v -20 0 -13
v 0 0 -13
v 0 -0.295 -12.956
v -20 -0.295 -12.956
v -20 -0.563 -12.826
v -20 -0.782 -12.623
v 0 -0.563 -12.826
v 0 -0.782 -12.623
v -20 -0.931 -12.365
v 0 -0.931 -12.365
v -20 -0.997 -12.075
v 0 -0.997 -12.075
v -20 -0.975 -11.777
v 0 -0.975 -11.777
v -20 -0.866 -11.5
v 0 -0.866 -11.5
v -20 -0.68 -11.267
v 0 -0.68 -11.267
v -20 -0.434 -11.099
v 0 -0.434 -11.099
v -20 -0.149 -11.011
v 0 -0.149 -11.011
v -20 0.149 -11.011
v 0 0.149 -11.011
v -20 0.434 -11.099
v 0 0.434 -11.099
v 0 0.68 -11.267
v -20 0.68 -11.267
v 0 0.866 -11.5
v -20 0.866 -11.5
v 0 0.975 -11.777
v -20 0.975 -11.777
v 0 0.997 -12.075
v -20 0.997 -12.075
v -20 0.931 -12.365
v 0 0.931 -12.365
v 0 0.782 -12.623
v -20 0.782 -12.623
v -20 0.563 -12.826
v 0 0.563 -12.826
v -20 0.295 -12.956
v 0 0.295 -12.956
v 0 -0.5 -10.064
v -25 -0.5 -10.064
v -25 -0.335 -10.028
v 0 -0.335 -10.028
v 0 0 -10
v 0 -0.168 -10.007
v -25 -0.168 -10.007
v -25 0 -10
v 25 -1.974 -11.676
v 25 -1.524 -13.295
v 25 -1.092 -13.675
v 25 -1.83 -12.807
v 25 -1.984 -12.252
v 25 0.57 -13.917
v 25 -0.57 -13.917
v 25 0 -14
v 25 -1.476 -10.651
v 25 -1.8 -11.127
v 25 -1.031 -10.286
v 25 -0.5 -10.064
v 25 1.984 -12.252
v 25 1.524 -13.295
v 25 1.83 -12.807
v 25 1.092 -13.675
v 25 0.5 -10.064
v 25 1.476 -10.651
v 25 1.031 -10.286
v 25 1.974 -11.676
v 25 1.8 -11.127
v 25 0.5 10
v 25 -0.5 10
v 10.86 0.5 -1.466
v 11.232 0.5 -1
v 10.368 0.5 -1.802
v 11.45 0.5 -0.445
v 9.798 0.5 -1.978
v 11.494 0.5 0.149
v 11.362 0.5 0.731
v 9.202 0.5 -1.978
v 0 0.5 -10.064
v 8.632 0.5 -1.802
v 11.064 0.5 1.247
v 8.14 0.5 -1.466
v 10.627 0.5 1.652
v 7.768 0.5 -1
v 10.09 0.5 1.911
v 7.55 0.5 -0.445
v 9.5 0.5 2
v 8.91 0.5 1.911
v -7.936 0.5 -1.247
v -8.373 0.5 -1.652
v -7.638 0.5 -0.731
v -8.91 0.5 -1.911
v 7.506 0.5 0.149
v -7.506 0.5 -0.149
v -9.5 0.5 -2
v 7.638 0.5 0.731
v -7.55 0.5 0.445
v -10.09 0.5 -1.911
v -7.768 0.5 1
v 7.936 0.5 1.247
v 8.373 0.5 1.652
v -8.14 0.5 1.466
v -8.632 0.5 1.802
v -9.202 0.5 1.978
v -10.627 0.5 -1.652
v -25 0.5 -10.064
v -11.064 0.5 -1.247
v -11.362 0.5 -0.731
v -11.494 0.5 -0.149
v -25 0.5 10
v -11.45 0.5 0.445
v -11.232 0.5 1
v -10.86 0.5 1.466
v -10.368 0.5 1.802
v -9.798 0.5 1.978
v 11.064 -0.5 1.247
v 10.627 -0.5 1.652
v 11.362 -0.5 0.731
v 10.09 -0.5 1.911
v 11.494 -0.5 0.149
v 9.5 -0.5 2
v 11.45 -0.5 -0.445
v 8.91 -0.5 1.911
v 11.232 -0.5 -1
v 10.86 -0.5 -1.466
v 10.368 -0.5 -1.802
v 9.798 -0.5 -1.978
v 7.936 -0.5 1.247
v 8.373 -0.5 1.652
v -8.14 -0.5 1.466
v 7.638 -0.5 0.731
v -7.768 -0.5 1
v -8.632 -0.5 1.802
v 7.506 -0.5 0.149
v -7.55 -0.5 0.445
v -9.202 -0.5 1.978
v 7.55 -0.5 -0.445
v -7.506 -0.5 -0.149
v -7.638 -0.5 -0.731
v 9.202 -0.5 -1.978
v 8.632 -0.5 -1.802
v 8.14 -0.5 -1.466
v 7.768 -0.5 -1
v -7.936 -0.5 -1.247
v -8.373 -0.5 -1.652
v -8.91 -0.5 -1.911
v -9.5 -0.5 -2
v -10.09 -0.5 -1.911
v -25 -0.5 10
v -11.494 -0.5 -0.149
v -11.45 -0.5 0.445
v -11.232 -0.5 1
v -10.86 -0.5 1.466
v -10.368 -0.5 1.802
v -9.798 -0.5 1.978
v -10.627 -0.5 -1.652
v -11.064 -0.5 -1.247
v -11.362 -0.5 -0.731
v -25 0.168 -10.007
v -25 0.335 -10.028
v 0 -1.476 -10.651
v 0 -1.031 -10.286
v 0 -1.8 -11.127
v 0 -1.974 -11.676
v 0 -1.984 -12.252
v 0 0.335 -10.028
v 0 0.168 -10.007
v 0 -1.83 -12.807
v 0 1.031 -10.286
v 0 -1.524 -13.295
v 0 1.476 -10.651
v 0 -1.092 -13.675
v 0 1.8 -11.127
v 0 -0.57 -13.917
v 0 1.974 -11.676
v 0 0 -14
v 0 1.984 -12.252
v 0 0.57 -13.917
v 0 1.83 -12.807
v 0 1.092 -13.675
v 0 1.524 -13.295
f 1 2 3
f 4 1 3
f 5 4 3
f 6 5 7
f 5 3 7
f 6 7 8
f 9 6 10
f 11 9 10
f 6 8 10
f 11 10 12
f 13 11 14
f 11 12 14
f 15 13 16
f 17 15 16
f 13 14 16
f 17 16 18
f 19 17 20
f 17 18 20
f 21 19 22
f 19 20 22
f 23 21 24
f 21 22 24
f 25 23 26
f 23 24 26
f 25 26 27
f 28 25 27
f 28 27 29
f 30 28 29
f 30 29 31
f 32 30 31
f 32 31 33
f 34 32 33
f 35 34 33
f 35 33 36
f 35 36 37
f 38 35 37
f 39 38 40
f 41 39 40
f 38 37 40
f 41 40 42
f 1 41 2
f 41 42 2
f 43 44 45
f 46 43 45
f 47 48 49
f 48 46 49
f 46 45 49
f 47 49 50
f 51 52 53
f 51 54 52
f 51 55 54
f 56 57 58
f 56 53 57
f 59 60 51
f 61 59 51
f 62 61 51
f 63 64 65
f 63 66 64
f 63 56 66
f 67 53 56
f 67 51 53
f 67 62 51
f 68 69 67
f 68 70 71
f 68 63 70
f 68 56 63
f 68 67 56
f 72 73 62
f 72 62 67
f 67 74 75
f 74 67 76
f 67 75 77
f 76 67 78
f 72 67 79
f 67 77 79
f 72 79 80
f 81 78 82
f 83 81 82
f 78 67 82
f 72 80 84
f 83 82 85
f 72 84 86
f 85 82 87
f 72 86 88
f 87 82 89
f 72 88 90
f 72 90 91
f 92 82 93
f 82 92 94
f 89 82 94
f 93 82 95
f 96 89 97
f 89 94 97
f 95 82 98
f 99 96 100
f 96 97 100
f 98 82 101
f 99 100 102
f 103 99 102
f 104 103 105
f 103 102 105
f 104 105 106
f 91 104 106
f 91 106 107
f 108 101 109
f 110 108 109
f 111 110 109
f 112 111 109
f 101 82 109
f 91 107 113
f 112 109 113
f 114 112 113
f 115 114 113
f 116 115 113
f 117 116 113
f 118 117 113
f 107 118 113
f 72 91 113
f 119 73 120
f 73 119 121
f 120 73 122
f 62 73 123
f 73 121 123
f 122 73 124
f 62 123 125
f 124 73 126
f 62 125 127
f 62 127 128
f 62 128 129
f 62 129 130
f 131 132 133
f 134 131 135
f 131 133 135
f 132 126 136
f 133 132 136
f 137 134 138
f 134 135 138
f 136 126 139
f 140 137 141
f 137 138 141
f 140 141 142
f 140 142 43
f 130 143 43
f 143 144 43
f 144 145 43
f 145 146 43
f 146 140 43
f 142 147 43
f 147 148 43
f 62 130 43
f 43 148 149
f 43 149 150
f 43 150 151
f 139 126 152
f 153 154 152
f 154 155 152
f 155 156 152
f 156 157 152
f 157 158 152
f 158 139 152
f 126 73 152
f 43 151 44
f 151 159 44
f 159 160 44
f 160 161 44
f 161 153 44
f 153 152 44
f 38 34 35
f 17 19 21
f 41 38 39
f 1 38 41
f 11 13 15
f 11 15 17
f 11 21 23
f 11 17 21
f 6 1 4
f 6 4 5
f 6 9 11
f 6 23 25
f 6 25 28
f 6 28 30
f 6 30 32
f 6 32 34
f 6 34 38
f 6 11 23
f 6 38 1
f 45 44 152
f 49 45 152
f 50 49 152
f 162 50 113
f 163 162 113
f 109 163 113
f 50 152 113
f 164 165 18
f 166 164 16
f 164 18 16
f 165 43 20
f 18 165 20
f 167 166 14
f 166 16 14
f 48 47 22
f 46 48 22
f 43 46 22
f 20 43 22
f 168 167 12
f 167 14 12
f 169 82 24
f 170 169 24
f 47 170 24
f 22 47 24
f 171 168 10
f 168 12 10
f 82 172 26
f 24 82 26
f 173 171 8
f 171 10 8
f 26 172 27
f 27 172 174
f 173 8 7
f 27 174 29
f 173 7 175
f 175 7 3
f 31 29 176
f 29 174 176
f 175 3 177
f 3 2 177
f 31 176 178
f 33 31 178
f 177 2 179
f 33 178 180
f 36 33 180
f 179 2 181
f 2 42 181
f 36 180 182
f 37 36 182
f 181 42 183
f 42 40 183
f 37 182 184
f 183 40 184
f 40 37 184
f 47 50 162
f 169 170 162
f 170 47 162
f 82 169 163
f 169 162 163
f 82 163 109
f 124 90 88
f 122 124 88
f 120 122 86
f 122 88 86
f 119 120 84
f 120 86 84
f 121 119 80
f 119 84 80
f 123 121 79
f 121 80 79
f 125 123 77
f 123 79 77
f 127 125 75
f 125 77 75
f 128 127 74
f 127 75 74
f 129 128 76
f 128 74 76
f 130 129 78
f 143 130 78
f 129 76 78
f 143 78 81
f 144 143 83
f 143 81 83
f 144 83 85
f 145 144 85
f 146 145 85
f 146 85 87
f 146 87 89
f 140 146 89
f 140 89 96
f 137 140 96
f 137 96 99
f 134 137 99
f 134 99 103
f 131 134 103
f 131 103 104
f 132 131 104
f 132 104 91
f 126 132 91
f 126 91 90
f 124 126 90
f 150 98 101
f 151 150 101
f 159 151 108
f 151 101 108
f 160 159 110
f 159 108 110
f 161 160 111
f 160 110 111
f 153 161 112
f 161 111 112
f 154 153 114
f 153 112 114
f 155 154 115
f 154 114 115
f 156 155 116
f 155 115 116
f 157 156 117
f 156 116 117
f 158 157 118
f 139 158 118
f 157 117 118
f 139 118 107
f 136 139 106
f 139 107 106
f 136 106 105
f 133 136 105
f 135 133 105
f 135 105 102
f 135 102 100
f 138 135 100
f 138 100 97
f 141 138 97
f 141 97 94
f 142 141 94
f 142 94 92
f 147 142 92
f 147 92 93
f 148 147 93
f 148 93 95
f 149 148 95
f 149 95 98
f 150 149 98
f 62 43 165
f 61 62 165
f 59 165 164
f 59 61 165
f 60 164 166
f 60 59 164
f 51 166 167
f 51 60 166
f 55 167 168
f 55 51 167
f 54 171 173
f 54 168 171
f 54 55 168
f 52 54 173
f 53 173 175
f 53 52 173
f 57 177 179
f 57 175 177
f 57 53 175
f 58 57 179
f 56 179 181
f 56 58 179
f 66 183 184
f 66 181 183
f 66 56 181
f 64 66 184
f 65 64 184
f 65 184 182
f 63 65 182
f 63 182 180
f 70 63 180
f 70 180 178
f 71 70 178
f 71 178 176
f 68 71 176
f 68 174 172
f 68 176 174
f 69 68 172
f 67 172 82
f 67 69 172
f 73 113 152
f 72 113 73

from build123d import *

# Parameters (mm, degrees)
SKETCH1_W                = 50
SKETCH1_H                = 20
BOSS_EXTRUDE1_DEPTH      = 0.5
SKETCH2_R                = 2
BOSS_EXTRUDE2_DEPTH      = 25
SKETCH3_R                = 1
BOSS_EXTRUDE3_DEPTH      = 20
BOSS_EXTRUDE4_REACH      = 34.078
BOSS_EXTRUDE4_END_RADIUS = 2
SKETCH4_W                = 50
SKETCH4_H                = 1
SKETCH5_R                = 2
CUT_EXTRUDE1_DEPTH       = 29.761954037


with BuildPart() as part:
    # Sketch1 → Boss-Extrude1 (new, symmetric)
    with BuildSketch(Plane(origin=(0, 0, 0), x_dir=(1, 0, 0), z_dir=(0, 1, 0))):
        Rectangle(SKETCH1_W, SKETCH1_H)
    extrude(amount=BOSS_EXTRUDE1_DEPTH, both=True)



with BuildPart() as body_2:
    # Sketch2 → Boss-Extrude2 (new body)
    with BuildSketch(Plane(origin=(25, 0, 0), x_dir=(0, 0, -1), z_dir=(1, 0, 0))):
        with Locations((12, 0)):
            Circle(SKETCH2_R)
    extrude(amount=-BOSS_EXTRUDE2_DEPTH)

    # Sketch3 → Boss-Extrude3 (add)
    with BuildSketch(Plane.ZY):
        with Locations((-12, 0)):
            Circle(SKETCH3_R)
    extrude(amount=BOSS_EXTRUDE3_DEPTH)


with BuildPart() as part_1:
    add(part.part)

    add(body_2.part)  # Boss-Extrude4 merges body 2
    # Boss-Extrude4: up to this cylinder (the profile starts outside it)
    boss_extrude4_end = Plane(origin=(0, 0, -12), z_dir=(1, 0, 0)) * Cylinder(BOSS_EXTRUDE4_END_RADIUS, 73.156, mode=Mode.PRIVATE)
    # Sketch4 → Boss-Extrude4 (add, up to the surface)
    with BuildSketch(Plane(origin=(0, 0, -10), x_dir=(-1, 0, 0), z_dir=(0, 0, -1)), mode=Mode.PRIVATE) as boss_extrude4_sk1:
        Rectangle(SKETCH4_W, SKETCH4_H)
    boss_extrude4_tool1 = extrude(boss_extrude4_sk1.sketch, amount=BOSS_EXTRUDE4_REACH, mode=Mode.PRIVATE) - boss_extrude4_end
    add(boss_extrude4_tool1.solids().sort_by_distance((0, 0, -10))[0])
    add(boss_extrude4_tool1.solids().sort_by_distance((0, 0, -10))[1])

    # Sketch5 → Cut-Extrude1 (cut, through all)
    with BuildSketch(Plane(origin=(0, 0.5, 0), x_dir=(1, 0, 0), z_dir=(0, 1, 0))):
        with Locations((9.5, 0)):
            Circle(SKETCH5_R)
        with Locations((-9.5, 0)):
            Circle(SKETCH5_R)
    extrude(amount=-CUT_EXTRUDE1_DEPTH, mode=Mode.SUBTRACT)


solid = part_1.part
